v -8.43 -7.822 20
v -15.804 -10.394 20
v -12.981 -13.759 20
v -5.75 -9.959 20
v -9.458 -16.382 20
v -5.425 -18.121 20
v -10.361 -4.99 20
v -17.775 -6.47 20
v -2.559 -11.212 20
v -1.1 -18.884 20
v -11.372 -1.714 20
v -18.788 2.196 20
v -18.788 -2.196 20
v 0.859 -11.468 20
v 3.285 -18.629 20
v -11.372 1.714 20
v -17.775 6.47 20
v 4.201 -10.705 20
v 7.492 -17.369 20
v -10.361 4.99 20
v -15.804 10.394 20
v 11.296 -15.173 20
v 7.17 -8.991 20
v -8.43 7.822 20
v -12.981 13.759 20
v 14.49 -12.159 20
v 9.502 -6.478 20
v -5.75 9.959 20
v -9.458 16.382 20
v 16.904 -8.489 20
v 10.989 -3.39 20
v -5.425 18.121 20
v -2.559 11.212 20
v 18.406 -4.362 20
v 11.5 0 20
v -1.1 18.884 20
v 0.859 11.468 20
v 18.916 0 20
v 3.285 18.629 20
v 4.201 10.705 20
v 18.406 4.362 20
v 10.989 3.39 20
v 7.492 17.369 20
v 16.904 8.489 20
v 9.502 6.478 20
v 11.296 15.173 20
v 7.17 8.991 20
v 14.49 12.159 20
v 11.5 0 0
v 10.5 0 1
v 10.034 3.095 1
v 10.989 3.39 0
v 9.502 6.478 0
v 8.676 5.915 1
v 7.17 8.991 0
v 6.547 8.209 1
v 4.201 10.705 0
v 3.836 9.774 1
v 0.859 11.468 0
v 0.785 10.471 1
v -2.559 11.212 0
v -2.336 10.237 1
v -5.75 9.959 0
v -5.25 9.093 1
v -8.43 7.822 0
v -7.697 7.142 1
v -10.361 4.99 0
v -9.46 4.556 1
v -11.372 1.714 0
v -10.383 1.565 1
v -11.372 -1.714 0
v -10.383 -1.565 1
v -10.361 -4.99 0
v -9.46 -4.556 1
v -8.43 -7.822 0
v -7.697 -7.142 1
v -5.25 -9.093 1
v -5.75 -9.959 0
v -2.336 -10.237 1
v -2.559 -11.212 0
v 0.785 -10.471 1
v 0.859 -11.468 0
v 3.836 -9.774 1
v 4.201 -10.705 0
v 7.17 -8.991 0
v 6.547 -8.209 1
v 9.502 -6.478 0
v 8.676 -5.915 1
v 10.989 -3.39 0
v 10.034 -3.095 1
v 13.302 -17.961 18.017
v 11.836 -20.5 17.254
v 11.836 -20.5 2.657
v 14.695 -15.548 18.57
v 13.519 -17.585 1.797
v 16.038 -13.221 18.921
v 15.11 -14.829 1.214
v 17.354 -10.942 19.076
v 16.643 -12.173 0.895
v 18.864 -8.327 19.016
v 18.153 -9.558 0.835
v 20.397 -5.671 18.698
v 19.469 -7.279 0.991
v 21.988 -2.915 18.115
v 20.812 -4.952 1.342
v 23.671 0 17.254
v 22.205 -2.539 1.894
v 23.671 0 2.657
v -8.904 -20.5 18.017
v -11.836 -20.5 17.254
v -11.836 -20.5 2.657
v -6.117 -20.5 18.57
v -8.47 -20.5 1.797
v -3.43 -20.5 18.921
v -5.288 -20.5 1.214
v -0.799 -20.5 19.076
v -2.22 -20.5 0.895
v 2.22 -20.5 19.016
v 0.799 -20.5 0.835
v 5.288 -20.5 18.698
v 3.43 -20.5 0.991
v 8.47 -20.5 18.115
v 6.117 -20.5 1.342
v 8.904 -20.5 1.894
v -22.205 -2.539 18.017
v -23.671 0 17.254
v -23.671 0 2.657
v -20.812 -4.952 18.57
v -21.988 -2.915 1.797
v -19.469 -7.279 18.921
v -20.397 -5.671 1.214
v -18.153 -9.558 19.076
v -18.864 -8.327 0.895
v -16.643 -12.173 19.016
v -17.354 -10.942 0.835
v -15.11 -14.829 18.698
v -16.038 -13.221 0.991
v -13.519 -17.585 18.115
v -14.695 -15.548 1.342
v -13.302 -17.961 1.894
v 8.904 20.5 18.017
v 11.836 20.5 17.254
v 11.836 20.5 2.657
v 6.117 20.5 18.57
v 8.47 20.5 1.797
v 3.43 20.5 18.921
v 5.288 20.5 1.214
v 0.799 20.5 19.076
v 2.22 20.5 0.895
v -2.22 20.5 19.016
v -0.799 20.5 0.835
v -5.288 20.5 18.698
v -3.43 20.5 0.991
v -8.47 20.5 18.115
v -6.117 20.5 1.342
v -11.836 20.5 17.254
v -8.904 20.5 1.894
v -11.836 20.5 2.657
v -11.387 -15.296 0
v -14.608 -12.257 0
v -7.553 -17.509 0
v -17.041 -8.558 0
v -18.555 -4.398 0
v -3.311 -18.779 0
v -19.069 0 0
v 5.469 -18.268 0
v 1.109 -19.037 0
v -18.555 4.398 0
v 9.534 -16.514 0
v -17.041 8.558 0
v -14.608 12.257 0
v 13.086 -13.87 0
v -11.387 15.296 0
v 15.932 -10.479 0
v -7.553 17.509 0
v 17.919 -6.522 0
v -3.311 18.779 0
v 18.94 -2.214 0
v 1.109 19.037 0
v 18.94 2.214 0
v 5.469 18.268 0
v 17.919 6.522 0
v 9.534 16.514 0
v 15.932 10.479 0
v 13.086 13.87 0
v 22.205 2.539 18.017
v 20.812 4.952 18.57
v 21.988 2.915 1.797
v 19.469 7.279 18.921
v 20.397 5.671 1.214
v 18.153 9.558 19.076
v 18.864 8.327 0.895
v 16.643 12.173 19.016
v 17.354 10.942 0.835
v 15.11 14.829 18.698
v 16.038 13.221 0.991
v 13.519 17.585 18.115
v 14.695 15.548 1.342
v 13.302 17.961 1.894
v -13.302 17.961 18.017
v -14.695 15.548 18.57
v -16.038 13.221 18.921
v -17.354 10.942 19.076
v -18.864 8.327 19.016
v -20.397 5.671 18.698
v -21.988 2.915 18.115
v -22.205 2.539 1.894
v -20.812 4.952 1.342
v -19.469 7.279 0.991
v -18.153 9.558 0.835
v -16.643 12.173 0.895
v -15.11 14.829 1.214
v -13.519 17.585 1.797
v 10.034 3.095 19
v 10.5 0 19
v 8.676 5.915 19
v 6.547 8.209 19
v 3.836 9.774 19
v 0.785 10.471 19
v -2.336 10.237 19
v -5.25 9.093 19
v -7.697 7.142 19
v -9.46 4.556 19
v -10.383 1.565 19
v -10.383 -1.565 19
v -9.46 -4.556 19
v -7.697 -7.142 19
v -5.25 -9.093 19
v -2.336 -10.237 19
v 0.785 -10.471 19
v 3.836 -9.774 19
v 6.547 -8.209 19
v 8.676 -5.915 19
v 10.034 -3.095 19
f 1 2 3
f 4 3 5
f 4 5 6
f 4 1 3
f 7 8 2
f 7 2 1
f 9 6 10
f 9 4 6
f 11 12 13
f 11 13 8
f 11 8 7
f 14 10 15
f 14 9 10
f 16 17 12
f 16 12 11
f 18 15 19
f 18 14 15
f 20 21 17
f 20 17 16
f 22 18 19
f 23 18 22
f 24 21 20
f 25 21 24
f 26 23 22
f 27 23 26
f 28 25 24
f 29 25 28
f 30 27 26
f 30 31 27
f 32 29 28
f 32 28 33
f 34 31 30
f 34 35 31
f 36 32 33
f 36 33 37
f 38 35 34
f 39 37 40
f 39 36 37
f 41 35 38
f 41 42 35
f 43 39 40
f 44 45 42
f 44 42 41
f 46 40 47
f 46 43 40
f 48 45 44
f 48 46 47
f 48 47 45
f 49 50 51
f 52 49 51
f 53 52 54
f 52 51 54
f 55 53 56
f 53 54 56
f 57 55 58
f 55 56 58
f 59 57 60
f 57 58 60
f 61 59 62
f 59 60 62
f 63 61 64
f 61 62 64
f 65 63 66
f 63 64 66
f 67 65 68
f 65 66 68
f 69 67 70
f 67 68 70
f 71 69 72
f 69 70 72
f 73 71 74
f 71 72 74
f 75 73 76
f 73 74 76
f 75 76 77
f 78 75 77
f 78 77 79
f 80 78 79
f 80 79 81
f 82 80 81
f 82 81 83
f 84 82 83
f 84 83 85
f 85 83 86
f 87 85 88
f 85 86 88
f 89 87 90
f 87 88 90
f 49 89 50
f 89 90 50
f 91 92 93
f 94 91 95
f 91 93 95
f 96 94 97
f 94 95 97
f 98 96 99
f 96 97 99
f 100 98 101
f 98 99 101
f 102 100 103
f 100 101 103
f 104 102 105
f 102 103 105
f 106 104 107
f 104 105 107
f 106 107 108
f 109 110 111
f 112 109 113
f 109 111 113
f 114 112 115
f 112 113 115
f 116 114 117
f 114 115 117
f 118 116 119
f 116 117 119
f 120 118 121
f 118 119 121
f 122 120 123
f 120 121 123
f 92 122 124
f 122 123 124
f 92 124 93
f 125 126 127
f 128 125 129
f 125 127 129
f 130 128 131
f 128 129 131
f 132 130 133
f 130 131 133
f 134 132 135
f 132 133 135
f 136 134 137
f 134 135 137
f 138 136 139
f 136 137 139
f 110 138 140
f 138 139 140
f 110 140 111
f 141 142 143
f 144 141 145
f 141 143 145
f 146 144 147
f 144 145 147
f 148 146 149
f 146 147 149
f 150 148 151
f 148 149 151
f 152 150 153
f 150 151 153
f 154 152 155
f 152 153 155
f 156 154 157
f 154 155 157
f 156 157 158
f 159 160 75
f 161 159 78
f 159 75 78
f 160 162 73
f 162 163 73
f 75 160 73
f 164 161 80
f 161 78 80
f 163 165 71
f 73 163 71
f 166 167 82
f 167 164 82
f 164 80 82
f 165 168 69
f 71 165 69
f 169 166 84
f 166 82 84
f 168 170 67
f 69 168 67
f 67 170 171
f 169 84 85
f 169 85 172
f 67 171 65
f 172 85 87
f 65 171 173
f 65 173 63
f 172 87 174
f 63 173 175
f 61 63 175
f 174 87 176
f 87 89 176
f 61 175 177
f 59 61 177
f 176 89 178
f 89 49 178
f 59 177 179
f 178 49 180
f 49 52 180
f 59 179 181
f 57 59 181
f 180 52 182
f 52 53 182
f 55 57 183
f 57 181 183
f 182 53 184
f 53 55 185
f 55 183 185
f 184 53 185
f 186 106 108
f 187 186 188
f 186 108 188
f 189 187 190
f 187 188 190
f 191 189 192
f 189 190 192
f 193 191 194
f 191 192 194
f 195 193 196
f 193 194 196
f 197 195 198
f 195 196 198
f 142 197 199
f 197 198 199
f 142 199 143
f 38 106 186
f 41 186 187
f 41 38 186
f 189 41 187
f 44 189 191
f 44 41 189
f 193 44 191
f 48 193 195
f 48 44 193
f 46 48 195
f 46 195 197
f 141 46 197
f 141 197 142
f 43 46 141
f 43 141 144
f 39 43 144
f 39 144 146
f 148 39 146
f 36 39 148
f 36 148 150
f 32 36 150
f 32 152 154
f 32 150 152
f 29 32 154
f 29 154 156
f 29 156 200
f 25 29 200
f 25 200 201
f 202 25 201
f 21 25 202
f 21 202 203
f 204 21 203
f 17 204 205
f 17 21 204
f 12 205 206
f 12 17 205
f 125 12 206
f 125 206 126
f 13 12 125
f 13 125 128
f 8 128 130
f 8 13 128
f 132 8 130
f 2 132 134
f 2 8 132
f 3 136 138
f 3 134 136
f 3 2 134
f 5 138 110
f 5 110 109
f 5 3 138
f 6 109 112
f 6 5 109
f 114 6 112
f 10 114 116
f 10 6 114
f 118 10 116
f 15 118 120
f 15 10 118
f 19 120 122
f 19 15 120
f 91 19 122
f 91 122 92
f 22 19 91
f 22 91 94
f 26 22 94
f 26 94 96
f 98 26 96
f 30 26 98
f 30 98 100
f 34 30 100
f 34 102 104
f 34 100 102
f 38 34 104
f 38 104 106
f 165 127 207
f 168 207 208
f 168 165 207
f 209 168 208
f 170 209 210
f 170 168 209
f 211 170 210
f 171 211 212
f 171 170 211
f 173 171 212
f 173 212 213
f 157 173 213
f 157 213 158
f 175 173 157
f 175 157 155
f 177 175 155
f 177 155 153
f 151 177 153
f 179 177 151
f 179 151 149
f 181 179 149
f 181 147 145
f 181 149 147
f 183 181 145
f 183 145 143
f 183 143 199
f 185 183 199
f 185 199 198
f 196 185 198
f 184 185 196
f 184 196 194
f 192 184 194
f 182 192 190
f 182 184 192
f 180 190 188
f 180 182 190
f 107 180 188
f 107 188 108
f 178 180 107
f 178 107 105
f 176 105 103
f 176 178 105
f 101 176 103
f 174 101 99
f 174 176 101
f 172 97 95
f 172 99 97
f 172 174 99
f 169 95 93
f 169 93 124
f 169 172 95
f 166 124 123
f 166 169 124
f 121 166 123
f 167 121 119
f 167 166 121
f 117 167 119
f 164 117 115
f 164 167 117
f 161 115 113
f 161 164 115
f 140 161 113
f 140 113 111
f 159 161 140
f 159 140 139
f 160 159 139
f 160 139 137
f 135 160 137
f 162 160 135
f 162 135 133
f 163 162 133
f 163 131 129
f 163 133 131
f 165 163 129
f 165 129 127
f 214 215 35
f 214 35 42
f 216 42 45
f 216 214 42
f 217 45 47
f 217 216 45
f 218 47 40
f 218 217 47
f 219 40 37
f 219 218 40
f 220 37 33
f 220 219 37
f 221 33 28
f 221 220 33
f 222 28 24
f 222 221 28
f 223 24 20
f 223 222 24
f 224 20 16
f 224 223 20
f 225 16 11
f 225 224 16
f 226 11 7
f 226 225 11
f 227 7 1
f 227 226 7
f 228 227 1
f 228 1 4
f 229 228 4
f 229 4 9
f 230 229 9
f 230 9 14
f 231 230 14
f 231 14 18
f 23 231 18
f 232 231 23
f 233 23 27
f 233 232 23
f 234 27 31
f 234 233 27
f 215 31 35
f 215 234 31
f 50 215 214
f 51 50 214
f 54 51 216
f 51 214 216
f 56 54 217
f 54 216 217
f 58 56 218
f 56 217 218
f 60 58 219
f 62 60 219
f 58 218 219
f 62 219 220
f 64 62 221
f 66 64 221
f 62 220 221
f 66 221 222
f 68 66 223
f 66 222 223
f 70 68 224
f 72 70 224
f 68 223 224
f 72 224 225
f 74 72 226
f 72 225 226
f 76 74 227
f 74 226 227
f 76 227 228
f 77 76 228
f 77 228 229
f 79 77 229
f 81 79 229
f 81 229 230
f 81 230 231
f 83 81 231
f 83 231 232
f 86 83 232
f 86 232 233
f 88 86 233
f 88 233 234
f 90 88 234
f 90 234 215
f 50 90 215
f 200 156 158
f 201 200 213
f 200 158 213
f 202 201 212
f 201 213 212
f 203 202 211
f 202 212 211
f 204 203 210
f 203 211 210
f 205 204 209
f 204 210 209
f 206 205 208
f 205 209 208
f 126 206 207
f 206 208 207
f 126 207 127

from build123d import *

# Parameters (mm, degrees)
BASE_EXTRUDE_DEPTH         = 20
SZKIC1_OUTSIDE_W           = 72.884
SZKIC1_OUTSIDE_H           = 66.542
SZKIC1_OUTSIDE_R           = 18.915964881
WYTNIJ_WYCI_GNI_CIE1_DEPTH = 3
WYTNIJ_WYCI_GNI_CIE1_DRAFT = -60
SZKIC2_OUTSIDE_W           = 72.884
SZKIC2_OUTSIDE_H           = 66.542
SZKIC2_OUTSIDE_R           = 19.068904069
WYTNIJ_WYCI_GNI_CIE2_DEPTH = 3
WYTNIJ_WYCI_GNI_CIE2_DRAFT = -60
OTW_R_GWINTOWANY_M241_D    = 21
SFAZOWANIE1_SIZE           = 1


with BuildPart() as part:
    # Sketch1 → Base-Extrude (new body)
    with BuildSketch(Plane.XY):
        Polygon((23.671361037, 0), (11.835680518, 20.5), (-11.835680518, 20.5), (-23.671361037, 0), (-11.835680518, -20.5), (11.835680518, -20.5), align=None)
    extrude(amount=BASE_EXTRUDE_DEPTH)


with BuildPart() as wytnij_wyci_gni_cie1_tool:
    # Szkic1 outside → Wytnij-wyciągnięcie1 (with draft: the straight prism first)
    with BuildSketch(Plane.XY.offset(20)):
        Rectangle(SZKIC1_OUTSIDE_W, SZKIC1_OUTSIDE_H)
        Circle(SZKIC1_OUTSIDE_R, mode=Mode.SUBTRACT)
    extrude(amount=-WYTNIJ_WYCI_GNI_CIE1_DEPTH)
    # Wytnij-wyciągnięcie1: the draft: its side faces are tilted about the plane it starts from
    wytnij_wyci_gni_cie1_sides = [wytnij_wyci_gni_cie1_tool.faces().sort_by_distance(p)[0] for p in [
        (0, -33.271, 18.5),
        (36.442, 0, 18.5),
        (0, 33.271, 18.5),
        (-36.442, 0, 18.5),
        (-18.915964881, 0, 18.5),
    ]]
    draft(wytnij_wyci_gni_cie1_sides, Plane.XY.offset(20), WYTNIJ_WYCI_GNI_CIE1_DRAFT)


with BuildPart() as part_1:
    add(part.part)

    # Wytnij-wyciągnięcie1: cut by wytnij_wyci_gni_cie1_tool
    add(wytnij_wyci_gni_cie1_tool.part, mode=Mode.SUBTRACT)


with BuildPart() as wytnij_wyci_gni_cie2_tool:
    # Szkic2 outside → Wytnij-wyciągnięcie2 (with draft: the straight prism first)
    with BuildSketch(Plane(origin=(0, 0, 0), x_dir=(-1, 0, 0), z_dir=(0, 0, -1))):
        Rectangle(SZKIC2_OUTSIDE_W, SZKIC2_OUTSIDE_H)
        Circle(SZKIC2_OUTSIDE_R, mode=Mode.SUBTRACT)
    extrude(amount=-WYTNIJ_WYCI_GNI_CIE2_DEPTH)
    # Wytnij-wyciągnięcie2: the draft: its side faces are tilted about the plane it starts from
    wytnij_wyci_gni_cie2_sides = [wytnij_wyci_gni_cie2_tool.faces().sort_by_distance(p)[0] for p in [
        (0, -33.271, 1.5),
        (-36.442, 0, 1.5),
        (0, 33.271, 1.5),
        (36.442, 0, 1.5),
        (19.068904069, 0, 1.5),
    ]]
    draft(wytnij_wyci_gni_cie2_sides, Plane(origin=(0, 0, 0), x_dir=(-1, 0, 0), z_dir=(0, 0, -1)), WYTNIJ_WYCI_GNI_CIE2_DRAFT)


with BuildPart() as part_2:
    add(part_1.part)

    # Wytnij-wyciągnięcie2: cut by wytnij_wyci_gni_cie2_tool
    add(wytnij_wyci_gni_cie2_tool.part, mode=Mode.SUBTRACT)

    # Otwór gwintowany M241 (through all)
    with Locations(Plane(origin=(0, 0, 0), x_dir=(-1, 0, 0), z_dir=(0, 0, -1))):
        with Locations((0, 0)):
            Hole(OTW_R_GWINTOWANY_M241_D / 2)

    # Sfazowanie1
    sfazowanie1_edges = [part_2.edges().sort_by_distance(p)[0] for p in [
        (-10.5, 0, 0),
        (-10.5, 0, 20),
    ]]
    chamfer(sfazowanie1_edges, length=SFAZOWANIE1_SIZE)


solid = part_2.part
